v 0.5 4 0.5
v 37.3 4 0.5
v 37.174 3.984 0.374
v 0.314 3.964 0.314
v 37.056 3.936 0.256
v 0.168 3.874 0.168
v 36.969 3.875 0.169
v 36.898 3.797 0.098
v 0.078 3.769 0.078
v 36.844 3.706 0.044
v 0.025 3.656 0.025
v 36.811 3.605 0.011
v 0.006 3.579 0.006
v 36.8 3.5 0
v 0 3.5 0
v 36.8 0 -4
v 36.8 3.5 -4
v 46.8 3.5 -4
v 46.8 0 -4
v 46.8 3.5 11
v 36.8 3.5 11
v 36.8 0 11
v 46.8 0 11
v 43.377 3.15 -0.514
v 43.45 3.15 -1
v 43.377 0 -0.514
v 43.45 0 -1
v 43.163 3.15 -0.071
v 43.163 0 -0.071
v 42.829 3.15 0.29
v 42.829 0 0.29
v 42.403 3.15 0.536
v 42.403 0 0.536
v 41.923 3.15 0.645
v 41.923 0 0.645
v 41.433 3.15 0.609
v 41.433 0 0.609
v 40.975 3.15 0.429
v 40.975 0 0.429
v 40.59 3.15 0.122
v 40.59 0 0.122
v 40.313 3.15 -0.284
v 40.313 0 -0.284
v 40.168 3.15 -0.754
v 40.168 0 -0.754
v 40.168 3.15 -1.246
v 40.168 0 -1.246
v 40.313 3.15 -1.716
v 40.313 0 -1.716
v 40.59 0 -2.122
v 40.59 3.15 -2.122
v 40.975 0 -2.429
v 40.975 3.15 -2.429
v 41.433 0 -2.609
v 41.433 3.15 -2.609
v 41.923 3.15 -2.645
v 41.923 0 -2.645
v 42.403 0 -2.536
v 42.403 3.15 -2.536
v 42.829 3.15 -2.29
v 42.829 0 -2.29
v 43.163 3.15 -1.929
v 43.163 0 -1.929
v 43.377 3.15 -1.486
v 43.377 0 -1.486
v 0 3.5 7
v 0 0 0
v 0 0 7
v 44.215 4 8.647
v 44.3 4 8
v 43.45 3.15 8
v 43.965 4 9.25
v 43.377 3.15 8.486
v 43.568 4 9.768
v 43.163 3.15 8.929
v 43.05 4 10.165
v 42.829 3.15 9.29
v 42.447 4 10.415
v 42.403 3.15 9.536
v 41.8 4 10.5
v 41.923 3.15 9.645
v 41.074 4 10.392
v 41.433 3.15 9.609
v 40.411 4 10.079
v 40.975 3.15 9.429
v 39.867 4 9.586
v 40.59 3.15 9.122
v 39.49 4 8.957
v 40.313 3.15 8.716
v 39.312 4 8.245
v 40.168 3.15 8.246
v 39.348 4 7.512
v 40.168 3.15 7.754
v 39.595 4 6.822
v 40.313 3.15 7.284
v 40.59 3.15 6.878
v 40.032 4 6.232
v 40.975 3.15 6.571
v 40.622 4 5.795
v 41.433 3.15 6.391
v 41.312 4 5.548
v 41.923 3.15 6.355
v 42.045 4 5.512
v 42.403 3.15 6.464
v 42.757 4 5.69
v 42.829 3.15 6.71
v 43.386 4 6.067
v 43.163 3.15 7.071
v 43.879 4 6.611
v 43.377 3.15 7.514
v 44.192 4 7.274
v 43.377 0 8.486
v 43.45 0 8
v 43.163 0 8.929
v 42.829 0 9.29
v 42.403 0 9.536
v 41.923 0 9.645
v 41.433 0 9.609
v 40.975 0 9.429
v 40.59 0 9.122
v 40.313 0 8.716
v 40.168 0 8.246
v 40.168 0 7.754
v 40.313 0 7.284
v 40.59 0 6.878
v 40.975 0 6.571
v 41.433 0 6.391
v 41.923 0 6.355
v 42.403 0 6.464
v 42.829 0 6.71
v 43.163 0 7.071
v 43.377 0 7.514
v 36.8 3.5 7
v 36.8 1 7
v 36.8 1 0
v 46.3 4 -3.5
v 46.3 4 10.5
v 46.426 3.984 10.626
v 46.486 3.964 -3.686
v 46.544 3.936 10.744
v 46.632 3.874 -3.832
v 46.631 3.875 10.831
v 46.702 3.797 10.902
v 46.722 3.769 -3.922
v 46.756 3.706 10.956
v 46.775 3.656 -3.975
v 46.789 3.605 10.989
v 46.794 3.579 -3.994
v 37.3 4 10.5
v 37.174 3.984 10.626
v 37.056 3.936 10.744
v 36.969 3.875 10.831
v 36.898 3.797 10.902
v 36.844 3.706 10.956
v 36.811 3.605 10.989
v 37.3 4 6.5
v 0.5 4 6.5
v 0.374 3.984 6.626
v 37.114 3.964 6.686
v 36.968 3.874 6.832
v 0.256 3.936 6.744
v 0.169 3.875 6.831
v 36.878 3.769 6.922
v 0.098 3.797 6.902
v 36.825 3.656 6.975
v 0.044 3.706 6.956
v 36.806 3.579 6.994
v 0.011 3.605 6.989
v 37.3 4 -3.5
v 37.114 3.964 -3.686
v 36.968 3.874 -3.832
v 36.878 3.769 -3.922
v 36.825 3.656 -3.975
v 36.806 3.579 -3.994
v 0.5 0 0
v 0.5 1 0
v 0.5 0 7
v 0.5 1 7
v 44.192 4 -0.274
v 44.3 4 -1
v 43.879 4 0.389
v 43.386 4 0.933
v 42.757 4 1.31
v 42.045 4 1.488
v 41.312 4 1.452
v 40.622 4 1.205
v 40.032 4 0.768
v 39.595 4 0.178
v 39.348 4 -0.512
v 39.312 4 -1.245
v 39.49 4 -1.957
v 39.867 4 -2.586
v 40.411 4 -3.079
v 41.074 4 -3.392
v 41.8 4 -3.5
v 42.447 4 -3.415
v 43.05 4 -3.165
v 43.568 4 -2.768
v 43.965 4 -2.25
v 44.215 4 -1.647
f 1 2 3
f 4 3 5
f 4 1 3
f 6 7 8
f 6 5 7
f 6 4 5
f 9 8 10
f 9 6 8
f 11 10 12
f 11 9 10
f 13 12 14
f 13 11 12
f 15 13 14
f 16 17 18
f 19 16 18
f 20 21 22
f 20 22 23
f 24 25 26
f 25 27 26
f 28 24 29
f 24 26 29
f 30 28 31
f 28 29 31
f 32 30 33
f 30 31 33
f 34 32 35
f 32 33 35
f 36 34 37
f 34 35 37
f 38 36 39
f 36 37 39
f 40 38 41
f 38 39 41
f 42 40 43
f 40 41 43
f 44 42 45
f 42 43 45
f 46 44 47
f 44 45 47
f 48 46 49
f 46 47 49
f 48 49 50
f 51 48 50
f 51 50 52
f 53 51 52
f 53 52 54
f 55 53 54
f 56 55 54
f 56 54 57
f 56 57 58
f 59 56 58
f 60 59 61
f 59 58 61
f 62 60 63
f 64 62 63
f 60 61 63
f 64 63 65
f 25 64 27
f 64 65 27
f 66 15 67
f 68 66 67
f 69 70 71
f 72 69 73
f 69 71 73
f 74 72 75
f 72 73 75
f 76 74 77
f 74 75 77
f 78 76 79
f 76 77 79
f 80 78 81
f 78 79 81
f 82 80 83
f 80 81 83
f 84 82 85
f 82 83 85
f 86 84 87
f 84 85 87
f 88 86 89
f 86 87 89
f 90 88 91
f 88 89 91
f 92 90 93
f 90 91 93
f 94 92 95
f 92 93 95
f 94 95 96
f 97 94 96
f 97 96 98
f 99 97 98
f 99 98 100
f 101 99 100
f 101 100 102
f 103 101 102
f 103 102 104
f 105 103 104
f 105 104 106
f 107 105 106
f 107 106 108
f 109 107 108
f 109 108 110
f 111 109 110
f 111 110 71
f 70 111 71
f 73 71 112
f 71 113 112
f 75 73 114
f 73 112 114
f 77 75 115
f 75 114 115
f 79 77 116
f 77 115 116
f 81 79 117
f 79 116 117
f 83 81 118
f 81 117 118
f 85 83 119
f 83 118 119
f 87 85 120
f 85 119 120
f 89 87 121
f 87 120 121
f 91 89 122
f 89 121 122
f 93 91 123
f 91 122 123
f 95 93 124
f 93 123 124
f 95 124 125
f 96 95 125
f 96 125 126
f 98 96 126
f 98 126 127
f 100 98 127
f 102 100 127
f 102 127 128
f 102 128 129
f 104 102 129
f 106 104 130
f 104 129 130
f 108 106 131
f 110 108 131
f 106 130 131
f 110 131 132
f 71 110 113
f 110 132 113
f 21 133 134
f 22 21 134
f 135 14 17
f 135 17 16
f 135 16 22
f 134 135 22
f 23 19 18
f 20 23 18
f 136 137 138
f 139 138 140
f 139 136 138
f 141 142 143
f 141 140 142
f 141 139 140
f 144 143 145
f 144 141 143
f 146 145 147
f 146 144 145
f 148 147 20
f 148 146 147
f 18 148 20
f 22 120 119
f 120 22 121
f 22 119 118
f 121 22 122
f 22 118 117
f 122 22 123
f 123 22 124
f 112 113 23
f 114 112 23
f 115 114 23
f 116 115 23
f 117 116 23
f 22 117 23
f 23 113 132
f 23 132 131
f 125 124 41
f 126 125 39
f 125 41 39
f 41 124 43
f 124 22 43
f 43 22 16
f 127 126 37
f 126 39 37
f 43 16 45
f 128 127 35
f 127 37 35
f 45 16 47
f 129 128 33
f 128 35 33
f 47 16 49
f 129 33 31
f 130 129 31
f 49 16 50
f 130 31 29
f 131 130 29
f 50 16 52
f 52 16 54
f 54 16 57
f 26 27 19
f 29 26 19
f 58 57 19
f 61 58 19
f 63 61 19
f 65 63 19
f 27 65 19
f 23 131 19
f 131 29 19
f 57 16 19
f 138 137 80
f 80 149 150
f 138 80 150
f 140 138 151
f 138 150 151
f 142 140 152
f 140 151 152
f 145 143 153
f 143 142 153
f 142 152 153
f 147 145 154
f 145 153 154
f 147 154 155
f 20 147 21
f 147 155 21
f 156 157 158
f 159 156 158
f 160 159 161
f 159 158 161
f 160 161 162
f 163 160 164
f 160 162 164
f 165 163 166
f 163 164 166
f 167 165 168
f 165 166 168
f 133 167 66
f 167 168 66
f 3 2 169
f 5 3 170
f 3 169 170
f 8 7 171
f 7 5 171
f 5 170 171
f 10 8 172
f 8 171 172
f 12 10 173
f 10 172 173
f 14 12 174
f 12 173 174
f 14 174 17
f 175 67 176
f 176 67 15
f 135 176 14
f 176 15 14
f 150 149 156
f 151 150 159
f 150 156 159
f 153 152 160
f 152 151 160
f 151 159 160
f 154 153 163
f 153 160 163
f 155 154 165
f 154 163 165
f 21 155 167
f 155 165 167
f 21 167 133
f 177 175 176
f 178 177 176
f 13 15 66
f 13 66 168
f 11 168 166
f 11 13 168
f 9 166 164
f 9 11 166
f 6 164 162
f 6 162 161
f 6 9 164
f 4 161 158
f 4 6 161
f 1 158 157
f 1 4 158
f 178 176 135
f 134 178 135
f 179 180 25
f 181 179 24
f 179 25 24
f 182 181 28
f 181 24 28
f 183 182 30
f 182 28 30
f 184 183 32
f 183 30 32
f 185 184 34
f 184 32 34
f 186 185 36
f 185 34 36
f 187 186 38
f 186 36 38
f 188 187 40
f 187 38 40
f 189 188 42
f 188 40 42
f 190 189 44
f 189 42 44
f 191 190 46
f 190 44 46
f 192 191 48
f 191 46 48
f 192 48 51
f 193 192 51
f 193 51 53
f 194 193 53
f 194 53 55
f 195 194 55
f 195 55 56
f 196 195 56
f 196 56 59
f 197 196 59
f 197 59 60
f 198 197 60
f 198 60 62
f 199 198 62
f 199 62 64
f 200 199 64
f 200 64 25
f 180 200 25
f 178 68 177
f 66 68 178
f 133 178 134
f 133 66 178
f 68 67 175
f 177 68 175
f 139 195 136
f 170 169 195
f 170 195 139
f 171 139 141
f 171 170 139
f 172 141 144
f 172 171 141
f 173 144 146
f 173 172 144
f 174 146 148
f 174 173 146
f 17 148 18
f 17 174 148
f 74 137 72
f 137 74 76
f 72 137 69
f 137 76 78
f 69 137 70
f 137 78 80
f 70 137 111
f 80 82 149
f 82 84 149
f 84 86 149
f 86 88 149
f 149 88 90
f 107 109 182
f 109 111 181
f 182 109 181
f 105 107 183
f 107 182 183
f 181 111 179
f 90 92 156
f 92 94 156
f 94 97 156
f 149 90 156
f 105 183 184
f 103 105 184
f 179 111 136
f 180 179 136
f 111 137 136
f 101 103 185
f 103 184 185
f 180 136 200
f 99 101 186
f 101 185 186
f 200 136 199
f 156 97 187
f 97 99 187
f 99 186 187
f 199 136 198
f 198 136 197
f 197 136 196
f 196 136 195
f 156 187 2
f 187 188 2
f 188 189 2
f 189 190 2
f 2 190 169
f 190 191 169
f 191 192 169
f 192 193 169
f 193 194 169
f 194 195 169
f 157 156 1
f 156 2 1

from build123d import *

# Parameters (mm, degrees)
F3_DEPTH       = 7
F5_DEPTH       = 4
F5_DEPTH_BACK  = 11
F7_D           = 3.3
F7_CSINK_D     = 5
F7_CSINK_ANGLE = 90
F8_T1_DEPTH    = 38.05
F8_T3_DEPTH    = 9.5
F8_T5_DEPTH    = 12.5
F8_T7_DEPTH    = 5.25
F8_T9_DEPTH    = 5.25
F8_T11_DEPTH   = 17.5
F8_T17_DEPTH   = 39.3
F8_T21_DEPTH   = 6.5
F8_T28_DEPTH   = 39.3
F8_T32_DEPTH   = 6.5


# Not quite as in the source:
# - a fillet or chamfer that OpenCascade refuses, or shapes differently, is made with other operations: its cross-section is extruded or revolved along the edge and cut away or added


with BuildPart() as f3:
    # F2 (on Top) → F3 (new body)
    with BuildSketch(Plane.XY):
        Polygon((0, 4), (0, 0), (0.5, 0), (0.5, 1), (36.8, 1), (36.8, 0), (46.8, 0), (46.8, 4), align=None)
    extrude(amount=F3_DEPTH)

    # F4 (on face) → F5 (join, two sides)
    with BuildSketch(Plane.XY.offset(7)) as f5_sk:
        Polygon((36.8, 1), (36.8, 0), (46.8, 0), (46.8, 4), (36.8, 4), align=None)
    extrude(amount=F5_DEPTH)
    extrude(f5_sk.sketch, amount=-F5_DEPTH_BACK)

    # F7 (through all)
    with Locations(Plane(origin=(0, 4, 0), x_dir=(-1, 0, 0), z_dir=(0, 1, 0))):
        with Locations((-41.8, 8), (-41.8, -1)):
            CounterSinkHole(F7_D / 2, F7_CSINK_D / 2, counter_sink_angle=F7_CSINK_ANGLE)

    # F8: fillet of radius 0.5 on 8 edges, made by hand

    # F8_s2 → F8_t1 (cut)
    with BuildSketch(Plane.YZ.offset(-1.25)):
        with BuildLine():
            ThreePointArc((4, 6.5), (3.8535533906, 6.8535533906), (3.5, 7))
            Line((3.5, 7), (4, 7))
            Line((4, 7), (4, 6.5))
        make_face()
        with BuildLine():
            ThreePointArc((4, 0.5), (3.8535533906, 0.1464466094), (3.5, 0))
            Line((3.5, 0), (4, 0))
            Line((4, 0), (4, 0.5))
        make_face()
    extrude(amount=F8_T1_DEPTH, mode=Mode.SUBTRACT)

    # F8_s4 → F8_t3 (cut)
    with BuildSketch(Plane.XY.offset(-1.25)):
        with BuildLine():
            ThreePointArc((0, 3.5), (0.1464466094, 3.8535533906), (0.5, 4))
            Line((0.5, 4), (0, 4))
            Line((0, 4), (0, 3.5))
        make_face()
    extrude(amount=F8_T3_DEPTH, mode=Mode.SUBTRACT)

    # F8_s6 → F8_t5 (cut)
    with BuildSketch(Plane.YZ.offset(35.55)):
        with BuildLine():
            ThreePointArc((4, -3.5), (3.8535533906, -3.8535533906), (3.5, -4))
            Line((3.5, -4), (4, -4))
            Line((4, -4), (4, -3.5))
        make_face()
        with BuildLine():
            ThreePointArc((4, 10.5), (3.8535533906, 10.8535533906), (3.5, 11))
            Line((3.5, 11), (4, 11))
            Line((4, 11), (4, 10.5))
        make_face()
    extrude(amount=F8_T5_DEPTH, mode=Mode.SUBTRACT)

    # F8_s8 → F8_t7 (cut)
    with BuildSketch(Plane.XY.offset(-5.25)):
        with BuildLine():
            ThreePointArc((37.3, 4), (36.9464466094, 3.8535533906), (36.8, 3.5))
            Line((36.8, 3.5), (36.8, 4))
            Line((36.8, 4), (37.3, 4))
        make_face()
    extrude(amount=F8_T7_DEPTH, mode=Mode.SUBTRACT)

    # F8_s10 → F8_t9 (cut)
    with BuildSketch(Plane.XY.offset(7)):
        with BuildLine():
            ThreePointArc((37.3, 4), (36.9464466094, 3.8535533906), (36.8, 3.5))
            Line((36.8, 3.5), (36.8, 4))
            Line((36.8, 4), (37.3, 4))
        make_face()
    extrude(amount=F8_T9_DEPTH, mode=Mode.SUBTRACT)

    # F8_s12 → F8_t11 (cut)
    with BuildSketch(Plane.XY.offset(-5.25)):
        with BuildLine():
            ThreePointArc((46.3, 4), (46.6535533906, 3.8535533906), (46.8, 3.5))
            Line((46.8, 3.5), (46.8, 4))
            Line((46.8, 4), (46.3, 4))
        make_face()
    extrude(amount=F8_T11_DEPTH, mode=Mode.SUBTRACT)


with BuildPart() as f8_tool15:
    # F8_s16 → F8_t17 (new body)
    with BuildSketch(Plane.YZ.offset(38.05)):
        with BuildLine():
            ThreePointArc((4, 6.5), (3.8535533906, 6.8535533906), (3.5, 7))
            Line((3.5, 7), (4, 7))
            Line((4, 7), (4, 6.5))
        make_face()
    extrude(amount=-F8_T17_DEPTH)

    split(bisect_by=Plane.YZ.offset(36.8), keep=Keep.TOP)


with BuildPart() as f8_tool19:
    # F8_s20 → F8_t21 (new body)
    with BuildSketch(Plane.XY.offset(12.25)):
        with BuildLine():
            ThreePointArc((37.3, 4), (36.9464466094, 3.8535533906), (36.8, 3.5))
            Line((36.8, 3.5), (36.8, 4))
            Line((36.8, 4), (37.3, 4))
        make_face()
    extrude(amount=-F8_T21_DEPTH)

    split(bisect_by=Plane.XY.offset(7), keep=Keep.BOTTOM)


with BuildPart() as f8_tool15_1:
    add(f8_tool15.part)

    # F8_t23: intersect F8_tool19
    add(f8_tool19.part, mode=Mode.INTERSECT)


with BuildPart() as f3_1:
    add(f3.part)

    # F8_t13: cut F8_tool15
    add(f8_tool15_1.part, mode=Mode.SUBTRACT)


with BuildPart() as f8_tool26:
    # F8_s27 → F8_t28 (new body)
    with BuildSketch(Plane.YZ.offset(38.05)):
        with BuildLine():
            ThreePointArc((4, 0.5), (3.8535533906, 0.1464466094), (3.5, 0))
            Line((3.5, 0), (4, 0))
            Line((4, 0), (4, 0.5))
        make_face()
    extrude(amount=-F8_T28_DEPTH)

    split(bisect_by=Plane.YZ.offset(36.8), keep=Keep.TOP)


with BuildPart() as f8_tool30:
    # F8_s31 → F8_t32 (new body)
    with BuildSketch(Plane.XY.offset(1.25)):
        with BuildLine():
            ThreePointArc((37.3, 4), (36.9464466094, 3.8535533906), (36.8, 3.5))
            Line((36.8, 3.5), (36.8, 4))
            Line((36.8, 4), (37.3, 4))
        make_face()
    extrude(amount=-F8_T32_DEPTH)

    split(bisect_by=Plane.XY, keep=Keep.TOP)


with BuildPart() as f8_tool26_1:
    add(f8_tool26.part)

    # F8_t34: intersect F8_tool30
    add(f8_tool30.part, mode=Mode.INTERSECT)


with BuildPart() as f3_2:
    add(f3_1.part)

    # F8_t24: cut F8_tool26
    add(f8_tool26_1.part, mode=Mode.SUBTRACT)


solid = f3_2.part
